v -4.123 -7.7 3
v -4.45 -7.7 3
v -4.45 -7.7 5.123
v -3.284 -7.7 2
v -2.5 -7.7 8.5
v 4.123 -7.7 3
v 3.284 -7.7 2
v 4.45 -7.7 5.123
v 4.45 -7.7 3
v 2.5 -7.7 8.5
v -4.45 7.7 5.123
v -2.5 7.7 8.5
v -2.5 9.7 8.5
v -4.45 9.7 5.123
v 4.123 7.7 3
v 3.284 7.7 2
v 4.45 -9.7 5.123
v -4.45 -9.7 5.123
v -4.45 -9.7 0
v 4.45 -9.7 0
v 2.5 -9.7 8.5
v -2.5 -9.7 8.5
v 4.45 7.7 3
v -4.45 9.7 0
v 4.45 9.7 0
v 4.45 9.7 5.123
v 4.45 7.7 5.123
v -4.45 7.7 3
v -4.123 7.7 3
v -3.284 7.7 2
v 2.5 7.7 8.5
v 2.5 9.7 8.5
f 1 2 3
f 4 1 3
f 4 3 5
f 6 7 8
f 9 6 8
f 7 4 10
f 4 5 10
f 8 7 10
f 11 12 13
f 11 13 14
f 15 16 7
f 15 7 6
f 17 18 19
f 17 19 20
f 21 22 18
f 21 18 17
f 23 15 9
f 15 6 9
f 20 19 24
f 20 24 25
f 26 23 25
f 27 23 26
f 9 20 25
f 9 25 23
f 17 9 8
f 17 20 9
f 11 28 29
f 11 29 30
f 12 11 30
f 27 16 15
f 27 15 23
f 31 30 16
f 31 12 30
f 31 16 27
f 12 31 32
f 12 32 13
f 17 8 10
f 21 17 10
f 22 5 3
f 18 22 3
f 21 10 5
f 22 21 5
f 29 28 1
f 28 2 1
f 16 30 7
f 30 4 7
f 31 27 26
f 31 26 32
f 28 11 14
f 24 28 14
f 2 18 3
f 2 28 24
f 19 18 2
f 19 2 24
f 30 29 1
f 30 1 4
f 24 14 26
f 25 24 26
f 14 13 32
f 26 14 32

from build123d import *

# Parameters (mm, degrees)
F1_DEPTH = 9.7
F3_DEPTH = 7.7


with BuildPart() as f1:
    # F0 (on Front) → F1 (new body)
    with BuildSketch(Plane.XZ):
        Polygon((2.5, 8.5), (0, 8.5), (-2.5, 8.5), (-4.45, 5.1225009252), (-4.45, 0), (0, 0), (4.45, 0), (4.45, 5.1225009252), align=None)
    extrude(amount=F1_DEPTH)

    # F2 (on Front) → F3 (cut, through all)
    with BuildSketch(Plane.XZ):
        Polygon((-4.45, 5.1225009252), (-4.45, 3), (-4.1234630536, 3), (-3.2843634225, 2), (0, 2), (0, 8.5), (-2.5, 8.5), align=None)
        Polygon((0, 8.5), (0, 2), (3.2843634225, 2), (4.1234630536, 3), (4.45, 3), (4.45, 5.1225009252), (2.5, 8.5), align=None)
    extrude(amount=F3_DEPTH, mode=Mode.SUBTRACT)

    # F4: F1 across plane


with BuildPart() as f1_1:
    add(f1.part)
    add(f1.part.mirror(Plane.XZ))


solid = f1_1.part
